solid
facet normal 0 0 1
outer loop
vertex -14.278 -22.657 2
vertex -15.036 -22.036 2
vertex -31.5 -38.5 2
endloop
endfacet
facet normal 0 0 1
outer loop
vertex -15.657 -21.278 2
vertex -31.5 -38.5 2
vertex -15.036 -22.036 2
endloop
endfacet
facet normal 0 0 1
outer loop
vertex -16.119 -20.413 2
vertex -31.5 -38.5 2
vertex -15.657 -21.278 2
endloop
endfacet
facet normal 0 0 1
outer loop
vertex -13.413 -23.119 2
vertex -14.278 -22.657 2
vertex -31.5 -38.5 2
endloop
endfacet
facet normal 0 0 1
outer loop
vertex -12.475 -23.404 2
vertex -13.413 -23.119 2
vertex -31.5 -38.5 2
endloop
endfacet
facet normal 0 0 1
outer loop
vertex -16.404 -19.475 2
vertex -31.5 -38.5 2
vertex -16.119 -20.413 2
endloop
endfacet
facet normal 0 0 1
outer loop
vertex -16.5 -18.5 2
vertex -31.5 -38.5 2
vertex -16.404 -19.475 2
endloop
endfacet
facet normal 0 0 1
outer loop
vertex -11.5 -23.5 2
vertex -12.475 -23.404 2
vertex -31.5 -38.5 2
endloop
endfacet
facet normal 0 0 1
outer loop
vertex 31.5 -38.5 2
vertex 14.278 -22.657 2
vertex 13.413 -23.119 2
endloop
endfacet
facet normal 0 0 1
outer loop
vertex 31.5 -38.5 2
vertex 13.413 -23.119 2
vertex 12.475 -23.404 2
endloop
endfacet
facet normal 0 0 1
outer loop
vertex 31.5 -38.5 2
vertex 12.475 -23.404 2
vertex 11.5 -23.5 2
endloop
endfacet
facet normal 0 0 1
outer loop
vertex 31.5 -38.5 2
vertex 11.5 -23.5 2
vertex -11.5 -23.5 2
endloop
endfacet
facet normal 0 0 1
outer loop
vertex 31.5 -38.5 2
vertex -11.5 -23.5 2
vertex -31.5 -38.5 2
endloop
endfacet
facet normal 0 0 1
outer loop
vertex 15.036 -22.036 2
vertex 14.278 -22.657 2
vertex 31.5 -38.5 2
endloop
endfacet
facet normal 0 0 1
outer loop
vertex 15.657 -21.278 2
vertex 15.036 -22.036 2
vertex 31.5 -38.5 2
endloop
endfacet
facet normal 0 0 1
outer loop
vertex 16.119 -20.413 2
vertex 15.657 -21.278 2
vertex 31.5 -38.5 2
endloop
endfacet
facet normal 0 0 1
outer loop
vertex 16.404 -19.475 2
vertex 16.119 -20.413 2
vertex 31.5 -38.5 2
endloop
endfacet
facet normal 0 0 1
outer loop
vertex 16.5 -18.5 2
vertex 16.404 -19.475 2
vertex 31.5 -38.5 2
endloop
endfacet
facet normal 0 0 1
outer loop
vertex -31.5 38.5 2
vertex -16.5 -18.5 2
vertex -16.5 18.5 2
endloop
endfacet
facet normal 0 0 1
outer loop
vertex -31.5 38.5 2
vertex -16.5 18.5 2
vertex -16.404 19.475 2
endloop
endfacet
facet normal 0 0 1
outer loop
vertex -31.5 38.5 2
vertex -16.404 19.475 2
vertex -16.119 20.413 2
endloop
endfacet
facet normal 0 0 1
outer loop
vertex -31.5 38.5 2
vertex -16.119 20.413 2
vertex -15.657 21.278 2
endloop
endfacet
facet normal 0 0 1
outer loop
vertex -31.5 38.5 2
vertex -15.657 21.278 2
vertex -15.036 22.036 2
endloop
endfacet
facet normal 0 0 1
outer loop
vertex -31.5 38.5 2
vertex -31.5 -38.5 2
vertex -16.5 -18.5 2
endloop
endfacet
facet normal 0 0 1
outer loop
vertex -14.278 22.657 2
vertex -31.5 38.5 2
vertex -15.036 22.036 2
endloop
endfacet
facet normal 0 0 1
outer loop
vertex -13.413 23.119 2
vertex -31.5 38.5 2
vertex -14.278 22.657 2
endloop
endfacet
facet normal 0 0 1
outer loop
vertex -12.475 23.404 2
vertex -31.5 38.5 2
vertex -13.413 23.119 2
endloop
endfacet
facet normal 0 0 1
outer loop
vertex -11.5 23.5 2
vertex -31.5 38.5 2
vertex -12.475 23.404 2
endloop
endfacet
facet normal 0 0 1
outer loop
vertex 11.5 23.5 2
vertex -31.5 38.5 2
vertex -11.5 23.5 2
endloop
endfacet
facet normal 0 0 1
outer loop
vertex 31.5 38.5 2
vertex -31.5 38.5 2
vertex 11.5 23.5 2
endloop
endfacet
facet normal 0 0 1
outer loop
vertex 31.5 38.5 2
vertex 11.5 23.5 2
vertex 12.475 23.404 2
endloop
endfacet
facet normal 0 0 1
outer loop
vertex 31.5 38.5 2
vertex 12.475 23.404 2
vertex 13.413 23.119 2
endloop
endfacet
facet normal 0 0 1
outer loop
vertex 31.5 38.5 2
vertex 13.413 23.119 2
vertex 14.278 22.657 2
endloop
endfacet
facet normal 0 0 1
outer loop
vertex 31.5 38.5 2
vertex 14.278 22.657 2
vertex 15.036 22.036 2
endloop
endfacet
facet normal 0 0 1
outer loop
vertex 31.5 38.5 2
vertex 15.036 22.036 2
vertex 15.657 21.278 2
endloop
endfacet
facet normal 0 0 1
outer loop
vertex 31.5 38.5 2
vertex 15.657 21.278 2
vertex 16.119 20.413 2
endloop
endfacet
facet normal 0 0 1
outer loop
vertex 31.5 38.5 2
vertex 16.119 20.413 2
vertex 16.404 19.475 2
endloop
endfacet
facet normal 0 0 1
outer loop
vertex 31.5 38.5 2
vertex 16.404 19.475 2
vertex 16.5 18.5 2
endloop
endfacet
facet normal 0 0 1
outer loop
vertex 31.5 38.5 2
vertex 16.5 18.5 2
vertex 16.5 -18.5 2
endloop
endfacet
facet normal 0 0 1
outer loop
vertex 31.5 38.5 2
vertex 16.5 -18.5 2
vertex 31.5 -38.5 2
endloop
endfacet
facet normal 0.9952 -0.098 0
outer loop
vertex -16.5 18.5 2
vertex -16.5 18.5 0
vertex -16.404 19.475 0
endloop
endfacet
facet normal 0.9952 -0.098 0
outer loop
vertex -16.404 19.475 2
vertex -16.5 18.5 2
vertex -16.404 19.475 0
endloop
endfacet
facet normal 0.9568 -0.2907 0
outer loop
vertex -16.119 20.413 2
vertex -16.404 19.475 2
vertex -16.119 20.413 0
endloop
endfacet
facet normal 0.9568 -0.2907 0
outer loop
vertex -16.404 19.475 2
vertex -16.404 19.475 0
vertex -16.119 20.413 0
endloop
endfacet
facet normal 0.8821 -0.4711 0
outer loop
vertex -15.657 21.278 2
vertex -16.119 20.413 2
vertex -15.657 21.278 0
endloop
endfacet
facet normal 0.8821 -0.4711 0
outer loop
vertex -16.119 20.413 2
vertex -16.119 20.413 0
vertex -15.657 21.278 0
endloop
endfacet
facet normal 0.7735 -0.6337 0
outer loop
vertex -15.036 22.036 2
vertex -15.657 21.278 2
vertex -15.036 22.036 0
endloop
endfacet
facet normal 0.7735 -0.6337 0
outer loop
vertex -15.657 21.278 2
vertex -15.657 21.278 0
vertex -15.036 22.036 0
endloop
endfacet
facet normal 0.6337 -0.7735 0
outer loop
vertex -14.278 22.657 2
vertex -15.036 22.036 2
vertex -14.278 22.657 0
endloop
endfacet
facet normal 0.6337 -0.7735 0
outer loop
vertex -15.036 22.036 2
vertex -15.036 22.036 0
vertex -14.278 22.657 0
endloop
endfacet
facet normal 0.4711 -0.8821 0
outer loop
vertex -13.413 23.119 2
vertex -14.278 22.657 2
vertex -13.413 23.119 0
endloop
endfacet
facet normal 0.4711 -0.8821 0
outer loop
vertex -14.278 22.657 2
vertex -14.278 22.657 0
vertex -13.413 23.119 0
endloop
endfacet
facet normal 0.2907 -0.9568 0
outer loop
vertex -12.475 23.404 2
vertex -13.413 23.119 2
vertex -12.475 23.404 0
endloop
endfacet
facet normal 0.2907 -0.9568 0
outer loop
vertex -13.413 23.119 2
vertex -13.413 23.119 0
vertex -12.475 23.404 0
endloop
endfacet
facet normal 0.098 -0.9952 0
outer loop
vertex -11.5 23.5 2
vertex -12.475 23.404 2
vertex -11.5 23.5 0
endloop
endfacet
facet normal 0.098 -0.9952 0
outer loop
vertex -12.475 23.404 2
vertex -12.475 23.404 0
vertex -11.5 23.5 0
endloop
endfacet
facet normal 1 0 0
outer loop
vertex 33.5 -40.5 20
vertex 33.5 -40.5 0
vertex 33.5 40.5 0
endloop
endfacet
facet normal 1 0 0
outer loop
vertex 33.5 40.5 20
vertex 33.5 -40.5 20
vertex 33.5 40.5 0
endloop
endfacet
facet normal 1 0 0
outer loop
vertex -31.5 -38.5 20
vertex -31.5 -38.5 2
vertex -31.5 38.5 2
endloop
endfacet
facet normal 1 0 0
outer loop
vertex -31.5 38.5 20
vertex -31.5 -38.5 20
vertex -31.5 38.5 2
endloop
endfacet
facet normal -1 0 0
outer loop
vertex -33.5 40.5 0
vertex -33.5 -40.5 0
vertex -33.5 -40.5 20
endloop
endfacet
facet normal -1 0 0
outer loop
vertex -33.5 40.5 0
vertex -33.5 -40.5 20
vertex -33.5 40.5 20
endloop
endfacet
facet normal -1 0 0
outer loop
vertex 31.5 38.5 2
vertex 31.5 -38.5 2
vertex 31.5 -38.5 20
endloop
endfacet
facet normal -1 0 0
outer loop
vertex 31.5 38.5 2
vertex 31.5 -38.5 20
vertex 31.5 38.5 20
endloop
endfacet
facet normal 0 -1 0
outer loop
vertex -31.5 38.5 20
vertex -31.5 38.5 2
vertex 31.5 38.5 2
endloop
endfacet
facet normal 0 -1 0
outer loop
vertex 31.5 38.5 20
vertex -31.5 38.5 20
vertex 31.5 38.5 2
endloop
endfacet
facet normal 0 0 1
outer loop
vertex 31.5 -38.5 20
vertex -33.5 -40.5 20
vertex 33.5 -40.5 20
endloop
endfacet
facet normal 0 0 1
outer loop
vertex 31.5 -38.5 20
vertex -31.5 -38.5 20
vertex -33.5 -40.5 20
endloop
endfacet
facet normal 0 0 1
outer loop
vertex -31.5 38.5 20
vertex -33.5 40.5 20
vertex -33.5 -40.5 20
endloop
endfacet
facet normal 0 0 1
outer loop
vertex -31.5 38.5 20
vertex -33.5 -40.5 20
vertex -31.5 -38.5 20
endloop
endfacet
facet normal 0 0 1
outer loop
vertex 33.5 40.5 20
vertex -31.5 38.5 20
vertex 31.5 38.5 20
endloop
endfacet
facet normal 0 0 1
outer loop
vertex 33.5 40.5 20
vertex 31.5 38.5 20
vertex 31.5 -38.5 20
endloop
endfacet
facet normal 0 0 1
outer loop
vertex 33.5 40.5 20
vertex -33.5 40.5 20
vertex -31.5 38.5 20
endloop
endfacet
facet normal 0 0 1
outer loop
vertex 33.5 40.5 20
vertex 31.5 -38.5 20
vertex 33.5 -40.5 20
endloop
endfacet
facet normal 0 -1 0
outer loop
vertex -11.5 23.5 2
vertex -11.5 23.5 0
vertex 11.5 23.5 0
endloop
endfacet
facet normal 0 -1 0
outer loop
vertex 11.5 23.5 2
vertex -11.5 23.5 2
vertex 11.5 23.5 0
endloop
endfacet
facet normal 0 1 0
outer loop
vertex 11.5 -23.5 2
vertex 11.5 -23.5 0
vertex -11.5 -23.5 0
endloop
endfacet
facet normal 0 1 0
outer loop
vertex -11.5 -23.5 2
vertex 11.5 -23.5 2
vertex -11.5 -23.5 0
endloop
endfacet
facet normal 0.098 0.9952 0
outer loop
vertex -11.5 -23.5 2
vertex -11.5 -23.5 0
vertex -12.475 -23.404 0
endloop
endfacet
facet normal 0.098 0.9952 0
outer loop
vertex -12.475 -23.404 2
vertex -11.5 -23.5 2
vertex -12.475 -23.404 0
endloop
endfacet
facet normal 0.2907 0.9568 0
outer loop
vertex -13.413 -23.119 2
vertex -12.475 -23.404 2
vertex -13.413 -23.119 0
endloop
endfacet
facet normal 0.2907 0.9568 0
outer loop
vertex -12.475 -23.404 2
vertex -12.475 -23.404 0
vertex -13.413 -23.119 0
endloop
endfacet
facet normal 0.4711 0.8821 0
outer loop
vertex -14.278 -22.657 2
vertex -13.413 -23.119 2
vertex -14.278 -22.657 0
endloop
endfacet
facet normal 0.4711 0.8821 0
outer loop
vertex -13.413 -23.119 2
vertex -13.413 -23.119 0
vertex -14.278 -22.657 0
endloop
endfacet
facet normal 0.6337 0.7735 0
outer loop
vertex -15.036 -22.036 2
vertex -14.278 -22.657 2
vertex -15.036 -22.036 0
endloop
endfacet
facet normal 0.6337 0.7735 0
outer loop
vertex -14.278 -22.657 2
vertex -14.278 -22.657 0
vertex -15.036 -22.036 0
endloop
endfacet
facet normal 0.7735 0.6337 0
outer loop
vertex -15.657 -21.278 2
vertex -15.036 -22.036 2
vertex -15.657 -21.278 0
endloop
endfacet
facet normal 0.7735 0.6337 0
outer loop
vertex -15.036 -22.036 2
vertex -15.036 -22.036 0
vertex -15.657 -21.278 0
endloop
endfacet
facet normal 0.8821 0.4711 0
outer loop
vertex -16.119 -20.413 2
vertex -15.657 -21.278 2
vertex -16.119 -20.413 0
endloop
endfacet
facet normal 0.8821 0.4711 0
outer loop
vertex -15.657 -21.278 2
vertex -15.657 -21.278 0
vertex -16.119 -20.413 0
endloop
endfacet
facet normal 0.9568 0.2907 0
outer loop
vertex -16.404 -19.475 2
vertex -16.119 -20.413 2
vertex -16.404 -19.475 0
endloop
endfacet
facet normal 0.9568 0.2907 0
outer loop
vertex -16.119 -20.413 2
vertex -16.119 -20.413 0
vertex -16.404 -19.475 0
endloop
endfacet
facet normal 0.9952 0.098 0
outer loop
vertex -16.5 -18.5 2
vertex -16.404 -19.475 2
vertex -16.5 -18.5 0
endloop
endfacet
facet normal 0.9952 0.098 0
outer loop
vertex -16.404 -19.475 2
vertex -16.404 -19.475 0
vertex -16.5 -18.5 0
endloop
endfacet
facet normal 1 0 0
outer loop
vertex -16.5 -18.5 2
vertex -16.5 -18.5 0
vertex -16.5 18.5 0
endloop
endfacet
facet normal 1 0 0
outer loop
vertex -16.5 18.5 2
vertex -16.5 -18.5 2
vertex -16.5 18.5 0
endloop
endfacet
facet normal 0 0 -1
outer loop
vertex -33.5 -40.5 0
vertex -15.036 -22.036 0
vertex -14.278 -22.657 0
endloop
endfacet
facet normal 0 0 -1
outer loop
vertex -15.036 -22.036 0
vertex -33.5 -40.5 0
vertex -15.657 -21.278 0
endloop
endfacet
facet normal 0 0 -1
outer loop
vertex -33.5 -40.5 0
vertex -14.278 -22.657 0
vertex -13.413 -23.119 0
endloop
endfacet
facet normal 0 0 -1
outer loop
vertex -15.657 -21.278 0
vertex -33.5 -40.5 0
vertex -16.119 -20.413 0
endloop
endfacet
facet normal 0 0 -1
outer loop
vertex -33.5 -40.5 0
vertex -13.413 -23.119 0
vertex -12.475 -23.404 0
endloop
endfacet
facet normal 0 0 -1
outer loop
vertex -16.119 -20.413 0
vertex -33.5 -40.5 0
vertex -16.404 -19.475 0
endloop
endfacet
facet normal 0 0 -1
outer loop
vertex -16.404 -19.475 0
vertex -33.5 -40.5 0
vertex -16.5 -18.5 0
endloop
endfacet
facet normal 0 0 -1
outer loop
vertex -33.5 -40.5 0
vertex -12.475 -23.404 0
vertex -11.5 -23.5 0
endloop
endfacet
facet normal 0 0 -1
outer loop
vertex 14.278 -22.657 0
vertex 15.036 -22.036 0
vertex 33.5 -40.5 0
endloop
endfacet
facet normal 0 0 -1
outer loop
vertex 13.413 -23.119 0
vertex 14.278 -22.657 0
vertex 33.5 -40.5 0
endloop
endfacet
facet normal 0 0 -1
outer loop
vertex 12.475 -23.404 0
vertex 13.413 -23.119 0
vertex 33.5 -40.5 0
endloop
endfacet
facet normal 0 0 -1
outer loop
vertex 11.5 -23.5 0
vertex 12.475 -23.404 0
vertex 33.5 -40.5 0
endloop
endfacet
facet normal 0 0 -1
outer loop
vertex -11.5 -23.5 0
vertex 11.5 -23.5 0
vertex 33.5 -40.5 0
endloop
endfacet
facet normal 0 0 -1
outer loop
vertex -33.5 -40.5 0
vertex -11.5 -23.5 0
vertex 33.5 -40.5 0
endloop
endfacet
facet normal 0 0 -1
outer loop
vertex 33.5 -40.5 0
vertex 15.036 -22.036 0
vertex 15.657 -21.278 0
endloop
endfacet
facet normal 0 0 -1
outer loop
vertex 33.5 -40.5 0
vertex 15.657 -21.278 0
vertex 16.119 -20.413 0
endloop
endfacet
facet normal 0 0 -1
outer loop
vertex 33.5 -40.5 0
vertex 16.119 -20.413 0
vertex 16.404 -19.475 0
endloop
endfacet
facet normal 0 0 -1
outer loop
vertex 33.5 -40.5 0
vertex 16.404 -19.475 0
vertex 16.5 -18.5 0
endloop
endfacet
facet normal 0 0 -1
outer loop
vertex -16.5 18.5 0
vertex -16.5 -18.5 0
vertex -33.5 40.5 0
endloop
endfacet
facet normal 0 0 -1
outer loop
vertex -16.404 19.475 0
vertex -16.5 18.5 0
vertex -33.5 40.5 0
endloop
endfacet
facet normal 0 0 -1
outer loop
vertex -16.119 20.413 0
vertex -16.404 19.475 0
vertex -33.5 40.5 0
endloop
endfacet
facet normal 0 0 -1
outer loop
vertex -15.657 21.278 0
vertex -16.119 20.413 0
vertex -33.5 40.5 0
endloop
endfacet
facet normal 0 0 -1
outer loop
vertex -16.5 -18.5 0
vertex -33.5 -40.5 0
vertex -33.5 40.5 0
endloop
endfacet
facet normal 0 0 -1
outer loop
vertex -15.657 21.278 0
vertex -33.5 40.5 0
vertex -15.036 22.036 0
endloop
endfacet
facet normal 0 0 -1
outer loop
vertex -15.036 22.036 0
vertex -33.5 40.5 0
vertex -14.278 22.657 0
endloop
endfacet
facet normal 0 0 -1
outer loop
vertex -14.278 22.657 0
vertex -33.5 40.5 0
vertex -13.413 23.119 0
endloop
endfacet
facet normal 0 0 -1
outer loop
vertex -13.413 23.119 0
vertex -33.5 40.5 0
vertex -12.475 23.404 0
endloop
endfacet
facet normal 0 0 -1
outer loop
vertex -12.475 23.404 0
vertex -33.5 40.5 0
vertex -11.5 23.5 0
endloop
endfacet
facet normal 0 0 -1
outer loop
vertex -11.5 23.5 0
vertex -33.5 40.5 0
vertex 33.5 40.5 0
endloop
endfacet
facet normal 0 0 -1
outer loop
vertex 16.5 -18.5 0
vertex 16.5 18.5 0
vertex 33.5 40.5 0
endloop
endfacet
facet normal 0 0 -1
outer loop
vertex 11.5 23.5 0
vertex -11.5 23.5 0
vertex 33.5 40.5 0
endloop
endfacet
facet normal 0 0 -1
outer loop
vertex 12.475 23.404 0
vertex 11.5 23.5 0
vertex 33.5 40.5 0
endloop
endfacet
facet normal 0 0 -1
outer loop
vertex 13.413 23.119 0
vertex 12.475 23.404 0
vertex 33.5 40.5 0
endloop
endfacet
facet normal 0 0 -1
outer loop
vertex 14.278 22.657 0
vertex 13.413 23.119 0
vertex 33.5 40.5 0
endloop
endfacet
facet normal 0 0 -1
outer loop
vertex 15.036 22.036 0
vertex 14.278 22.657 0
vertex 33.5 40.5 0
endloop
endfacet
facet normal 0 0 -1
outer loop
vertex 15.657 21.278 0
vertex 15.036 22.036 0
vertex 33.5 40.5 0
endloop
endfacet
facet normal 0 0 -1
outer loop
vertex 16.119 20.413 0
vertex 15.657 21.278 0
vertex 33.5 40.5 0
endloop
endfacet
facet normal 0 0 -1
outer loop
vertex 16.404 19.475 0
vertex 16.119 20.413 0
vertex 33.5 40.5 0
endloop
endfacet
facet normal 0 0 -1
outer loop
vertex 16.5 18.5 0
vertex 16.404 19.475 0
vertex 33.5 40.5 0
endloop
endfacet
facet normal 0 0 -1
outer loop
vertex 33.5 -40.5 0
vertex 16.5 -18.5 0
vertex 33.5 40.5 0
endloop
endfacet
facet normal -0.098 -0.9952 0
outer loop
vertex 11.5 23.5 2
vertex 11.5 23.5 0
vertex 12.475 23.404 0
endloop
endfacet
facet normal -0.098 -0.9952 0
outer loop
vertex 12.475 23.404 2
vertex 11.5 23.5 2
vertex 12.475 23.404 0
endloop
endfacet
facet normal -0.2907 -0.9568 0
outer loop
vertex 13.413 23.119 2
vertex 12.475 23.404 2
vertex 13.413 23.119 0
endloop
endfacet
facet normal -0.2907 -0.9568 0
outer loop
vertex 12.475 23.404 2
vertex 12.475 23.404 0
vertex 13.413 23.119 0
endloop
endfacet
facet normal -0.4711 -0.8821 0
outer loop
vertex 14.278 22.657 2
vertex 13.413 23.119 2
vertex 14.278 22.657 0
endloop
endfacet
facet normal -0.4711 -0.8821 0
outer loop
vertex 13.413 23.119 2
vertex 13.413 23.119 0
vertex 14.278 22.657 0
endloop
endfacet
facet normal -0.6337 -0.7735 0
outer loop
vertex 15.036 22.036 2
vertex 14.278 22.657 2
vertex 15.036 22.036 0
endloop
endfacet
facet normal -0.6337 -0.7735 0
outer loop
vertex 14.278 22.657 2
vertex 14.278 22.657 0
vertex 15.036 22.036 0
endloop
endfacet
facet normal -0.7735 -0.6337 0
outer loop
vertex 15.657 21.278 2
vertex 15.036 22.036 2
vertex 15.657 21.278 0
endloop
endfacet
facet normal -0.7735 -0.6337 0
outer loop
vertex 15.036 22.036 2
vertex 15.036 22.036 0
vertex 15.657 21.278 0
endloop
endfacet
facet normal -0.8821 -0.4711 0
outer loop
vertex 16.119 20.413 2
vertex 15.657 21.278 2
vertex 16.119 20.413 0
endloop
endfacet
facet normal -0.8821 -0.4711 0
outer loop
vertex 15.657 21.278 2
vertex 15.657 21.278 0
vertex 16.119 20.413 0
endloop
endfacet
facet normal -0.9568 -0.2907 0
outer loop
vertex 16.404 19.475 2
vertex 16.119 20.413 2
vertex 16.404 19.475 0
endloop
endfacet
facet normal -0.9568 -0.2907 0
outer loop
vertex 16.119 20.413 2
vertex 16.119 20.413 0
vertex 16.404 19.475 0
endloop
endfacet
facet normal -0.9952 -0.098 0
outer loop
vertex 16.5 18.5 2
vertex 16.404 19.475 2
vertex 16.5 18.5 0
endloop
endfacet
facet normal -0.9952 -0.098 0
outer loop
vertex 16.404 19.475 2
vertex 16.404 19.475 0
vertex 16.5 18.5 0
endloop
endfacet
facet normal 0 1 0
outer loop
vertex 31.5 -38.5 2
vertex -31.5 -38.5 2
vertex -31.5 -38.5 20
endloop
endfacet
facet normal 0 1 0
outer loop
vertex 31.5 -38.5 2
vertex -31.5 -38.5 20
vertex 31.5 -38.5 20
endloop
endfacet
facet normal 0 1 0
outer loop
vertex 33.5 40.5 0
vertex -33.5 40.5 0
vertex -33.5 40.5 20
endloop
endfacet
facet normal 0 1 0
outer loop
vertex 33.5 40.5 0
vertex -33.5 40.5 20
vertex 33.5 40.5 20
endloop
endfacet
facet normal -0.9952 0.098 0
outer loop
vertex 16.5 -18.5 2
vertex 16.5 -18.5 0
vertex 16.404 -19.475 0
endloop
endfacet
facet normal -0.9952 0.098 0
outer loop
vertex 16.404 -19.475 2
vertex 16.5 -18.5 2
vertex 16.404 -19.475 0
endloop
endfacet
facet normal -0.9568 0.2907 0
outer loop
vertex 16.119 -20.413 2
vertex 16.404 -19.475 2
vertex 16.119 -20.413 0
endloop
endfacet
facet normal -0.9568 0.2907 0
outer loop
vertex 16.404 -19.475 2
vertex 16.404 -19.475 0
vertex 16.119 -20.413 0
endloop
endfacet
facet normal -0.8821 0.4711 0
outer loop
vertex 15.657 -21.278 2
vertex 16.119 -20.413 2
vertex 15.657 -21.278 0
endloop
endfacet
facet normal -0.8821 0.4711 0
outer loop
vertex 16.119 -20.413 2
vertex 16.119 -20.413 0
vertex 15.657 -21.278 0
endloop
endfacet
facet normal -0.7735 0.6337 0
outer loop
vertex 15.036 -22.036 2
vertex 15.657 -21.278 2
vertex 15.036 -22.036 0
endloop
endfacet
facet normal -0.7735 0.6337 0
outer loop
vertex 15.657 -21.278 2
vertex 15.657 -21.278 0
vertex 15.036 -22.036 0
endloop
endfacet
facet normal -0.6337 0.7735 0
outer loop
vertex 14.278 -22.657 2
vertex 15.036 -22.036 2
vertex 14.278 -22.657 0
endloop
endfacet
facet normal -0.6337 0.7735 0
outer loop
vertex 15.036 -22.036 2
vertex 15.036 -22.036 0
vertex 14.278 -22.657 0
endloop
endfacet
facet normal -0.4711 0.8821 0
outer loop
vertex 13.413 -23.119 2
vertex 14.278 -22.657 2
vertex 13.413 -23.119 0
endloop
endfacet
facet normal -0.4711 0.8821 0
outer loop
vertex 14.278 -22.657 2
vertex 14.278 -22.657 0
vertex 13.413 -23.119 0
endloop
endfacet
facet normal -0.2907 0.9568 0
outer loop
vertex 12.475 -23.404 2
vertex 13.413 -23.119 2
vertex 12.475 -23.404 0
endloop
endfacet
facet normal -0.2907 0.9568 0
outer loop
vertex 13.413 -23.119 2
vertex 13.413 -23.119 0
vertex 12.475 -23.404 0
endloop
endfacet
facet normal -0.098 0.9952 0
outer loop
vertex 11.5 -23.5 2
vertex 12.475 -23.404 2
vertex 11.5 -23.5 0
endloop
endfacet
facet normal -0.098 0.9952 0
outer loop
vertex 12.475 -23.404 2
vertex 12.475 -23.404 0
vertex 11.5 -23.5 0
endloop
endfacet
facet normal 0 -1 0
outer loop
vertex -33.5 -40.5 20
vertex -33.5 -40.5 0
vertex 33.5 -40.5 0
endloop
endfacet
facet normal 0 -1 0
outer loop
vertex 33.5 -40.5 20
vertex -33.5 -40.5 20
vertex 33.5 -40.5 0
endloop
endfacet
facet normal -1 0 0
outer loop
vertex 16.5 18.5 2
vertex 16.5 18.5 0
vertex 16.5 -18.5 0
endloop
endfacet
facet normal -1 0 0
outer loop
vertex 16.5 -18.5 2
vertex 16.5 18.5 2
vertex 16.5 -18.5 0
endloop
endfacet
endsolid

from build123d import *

# Parameters (mm, degrees)
F0_W     = 63
F0_H     = 77
F1_DEPTH = 2
F0_W_2   = 67
F0_H_2   = 81
F2_DEPTH = 20


with BuildPart() as f1:
    # F0 (on Top) → F1 (new body)
    with BuildSketch(Plane.XY):
        Rectangle(F0_W, F0_H)
        with BuildLine():
            ThreePointArc((-16.5, 18.5), (-15.035534, 22.035534), (-11.5, 23.5))
            Line((-11.5, 23.5), (11.5, 23.5))
            ThreePointArc((11.5, 23.5), (15.035534, 22.035534), (16.5, 18.5))
            Line((16.5, 18.5), (16.5, -18.5))
            ThreePointArc((16.5, -18.5), (15.035534, -22.035534), (11.5, -23.5))
            Line((11.5, -23.5), (-11.5, -23.5))
            ThreePointArc((-11.5, -23.5), (-15.035534, -22.035534), (-16.5, -18.5))
            Line((-16.5, -18.5), (-16.5, 18.5))
        make_face(mode=Mode.SUBTRACT)
    extrude(amount=F1_DEPTH)

    # F0 (on Top) → F2 (join)
    with BuildSketch(Plane.XY):
        Rectangle(F0_W_2, F0_H_2)
        Rectangle(F0_W, F0_H, mode=Mode.SUBTRACT)
    extrude(amount=F2_DEPTH)


solid = f1.part
